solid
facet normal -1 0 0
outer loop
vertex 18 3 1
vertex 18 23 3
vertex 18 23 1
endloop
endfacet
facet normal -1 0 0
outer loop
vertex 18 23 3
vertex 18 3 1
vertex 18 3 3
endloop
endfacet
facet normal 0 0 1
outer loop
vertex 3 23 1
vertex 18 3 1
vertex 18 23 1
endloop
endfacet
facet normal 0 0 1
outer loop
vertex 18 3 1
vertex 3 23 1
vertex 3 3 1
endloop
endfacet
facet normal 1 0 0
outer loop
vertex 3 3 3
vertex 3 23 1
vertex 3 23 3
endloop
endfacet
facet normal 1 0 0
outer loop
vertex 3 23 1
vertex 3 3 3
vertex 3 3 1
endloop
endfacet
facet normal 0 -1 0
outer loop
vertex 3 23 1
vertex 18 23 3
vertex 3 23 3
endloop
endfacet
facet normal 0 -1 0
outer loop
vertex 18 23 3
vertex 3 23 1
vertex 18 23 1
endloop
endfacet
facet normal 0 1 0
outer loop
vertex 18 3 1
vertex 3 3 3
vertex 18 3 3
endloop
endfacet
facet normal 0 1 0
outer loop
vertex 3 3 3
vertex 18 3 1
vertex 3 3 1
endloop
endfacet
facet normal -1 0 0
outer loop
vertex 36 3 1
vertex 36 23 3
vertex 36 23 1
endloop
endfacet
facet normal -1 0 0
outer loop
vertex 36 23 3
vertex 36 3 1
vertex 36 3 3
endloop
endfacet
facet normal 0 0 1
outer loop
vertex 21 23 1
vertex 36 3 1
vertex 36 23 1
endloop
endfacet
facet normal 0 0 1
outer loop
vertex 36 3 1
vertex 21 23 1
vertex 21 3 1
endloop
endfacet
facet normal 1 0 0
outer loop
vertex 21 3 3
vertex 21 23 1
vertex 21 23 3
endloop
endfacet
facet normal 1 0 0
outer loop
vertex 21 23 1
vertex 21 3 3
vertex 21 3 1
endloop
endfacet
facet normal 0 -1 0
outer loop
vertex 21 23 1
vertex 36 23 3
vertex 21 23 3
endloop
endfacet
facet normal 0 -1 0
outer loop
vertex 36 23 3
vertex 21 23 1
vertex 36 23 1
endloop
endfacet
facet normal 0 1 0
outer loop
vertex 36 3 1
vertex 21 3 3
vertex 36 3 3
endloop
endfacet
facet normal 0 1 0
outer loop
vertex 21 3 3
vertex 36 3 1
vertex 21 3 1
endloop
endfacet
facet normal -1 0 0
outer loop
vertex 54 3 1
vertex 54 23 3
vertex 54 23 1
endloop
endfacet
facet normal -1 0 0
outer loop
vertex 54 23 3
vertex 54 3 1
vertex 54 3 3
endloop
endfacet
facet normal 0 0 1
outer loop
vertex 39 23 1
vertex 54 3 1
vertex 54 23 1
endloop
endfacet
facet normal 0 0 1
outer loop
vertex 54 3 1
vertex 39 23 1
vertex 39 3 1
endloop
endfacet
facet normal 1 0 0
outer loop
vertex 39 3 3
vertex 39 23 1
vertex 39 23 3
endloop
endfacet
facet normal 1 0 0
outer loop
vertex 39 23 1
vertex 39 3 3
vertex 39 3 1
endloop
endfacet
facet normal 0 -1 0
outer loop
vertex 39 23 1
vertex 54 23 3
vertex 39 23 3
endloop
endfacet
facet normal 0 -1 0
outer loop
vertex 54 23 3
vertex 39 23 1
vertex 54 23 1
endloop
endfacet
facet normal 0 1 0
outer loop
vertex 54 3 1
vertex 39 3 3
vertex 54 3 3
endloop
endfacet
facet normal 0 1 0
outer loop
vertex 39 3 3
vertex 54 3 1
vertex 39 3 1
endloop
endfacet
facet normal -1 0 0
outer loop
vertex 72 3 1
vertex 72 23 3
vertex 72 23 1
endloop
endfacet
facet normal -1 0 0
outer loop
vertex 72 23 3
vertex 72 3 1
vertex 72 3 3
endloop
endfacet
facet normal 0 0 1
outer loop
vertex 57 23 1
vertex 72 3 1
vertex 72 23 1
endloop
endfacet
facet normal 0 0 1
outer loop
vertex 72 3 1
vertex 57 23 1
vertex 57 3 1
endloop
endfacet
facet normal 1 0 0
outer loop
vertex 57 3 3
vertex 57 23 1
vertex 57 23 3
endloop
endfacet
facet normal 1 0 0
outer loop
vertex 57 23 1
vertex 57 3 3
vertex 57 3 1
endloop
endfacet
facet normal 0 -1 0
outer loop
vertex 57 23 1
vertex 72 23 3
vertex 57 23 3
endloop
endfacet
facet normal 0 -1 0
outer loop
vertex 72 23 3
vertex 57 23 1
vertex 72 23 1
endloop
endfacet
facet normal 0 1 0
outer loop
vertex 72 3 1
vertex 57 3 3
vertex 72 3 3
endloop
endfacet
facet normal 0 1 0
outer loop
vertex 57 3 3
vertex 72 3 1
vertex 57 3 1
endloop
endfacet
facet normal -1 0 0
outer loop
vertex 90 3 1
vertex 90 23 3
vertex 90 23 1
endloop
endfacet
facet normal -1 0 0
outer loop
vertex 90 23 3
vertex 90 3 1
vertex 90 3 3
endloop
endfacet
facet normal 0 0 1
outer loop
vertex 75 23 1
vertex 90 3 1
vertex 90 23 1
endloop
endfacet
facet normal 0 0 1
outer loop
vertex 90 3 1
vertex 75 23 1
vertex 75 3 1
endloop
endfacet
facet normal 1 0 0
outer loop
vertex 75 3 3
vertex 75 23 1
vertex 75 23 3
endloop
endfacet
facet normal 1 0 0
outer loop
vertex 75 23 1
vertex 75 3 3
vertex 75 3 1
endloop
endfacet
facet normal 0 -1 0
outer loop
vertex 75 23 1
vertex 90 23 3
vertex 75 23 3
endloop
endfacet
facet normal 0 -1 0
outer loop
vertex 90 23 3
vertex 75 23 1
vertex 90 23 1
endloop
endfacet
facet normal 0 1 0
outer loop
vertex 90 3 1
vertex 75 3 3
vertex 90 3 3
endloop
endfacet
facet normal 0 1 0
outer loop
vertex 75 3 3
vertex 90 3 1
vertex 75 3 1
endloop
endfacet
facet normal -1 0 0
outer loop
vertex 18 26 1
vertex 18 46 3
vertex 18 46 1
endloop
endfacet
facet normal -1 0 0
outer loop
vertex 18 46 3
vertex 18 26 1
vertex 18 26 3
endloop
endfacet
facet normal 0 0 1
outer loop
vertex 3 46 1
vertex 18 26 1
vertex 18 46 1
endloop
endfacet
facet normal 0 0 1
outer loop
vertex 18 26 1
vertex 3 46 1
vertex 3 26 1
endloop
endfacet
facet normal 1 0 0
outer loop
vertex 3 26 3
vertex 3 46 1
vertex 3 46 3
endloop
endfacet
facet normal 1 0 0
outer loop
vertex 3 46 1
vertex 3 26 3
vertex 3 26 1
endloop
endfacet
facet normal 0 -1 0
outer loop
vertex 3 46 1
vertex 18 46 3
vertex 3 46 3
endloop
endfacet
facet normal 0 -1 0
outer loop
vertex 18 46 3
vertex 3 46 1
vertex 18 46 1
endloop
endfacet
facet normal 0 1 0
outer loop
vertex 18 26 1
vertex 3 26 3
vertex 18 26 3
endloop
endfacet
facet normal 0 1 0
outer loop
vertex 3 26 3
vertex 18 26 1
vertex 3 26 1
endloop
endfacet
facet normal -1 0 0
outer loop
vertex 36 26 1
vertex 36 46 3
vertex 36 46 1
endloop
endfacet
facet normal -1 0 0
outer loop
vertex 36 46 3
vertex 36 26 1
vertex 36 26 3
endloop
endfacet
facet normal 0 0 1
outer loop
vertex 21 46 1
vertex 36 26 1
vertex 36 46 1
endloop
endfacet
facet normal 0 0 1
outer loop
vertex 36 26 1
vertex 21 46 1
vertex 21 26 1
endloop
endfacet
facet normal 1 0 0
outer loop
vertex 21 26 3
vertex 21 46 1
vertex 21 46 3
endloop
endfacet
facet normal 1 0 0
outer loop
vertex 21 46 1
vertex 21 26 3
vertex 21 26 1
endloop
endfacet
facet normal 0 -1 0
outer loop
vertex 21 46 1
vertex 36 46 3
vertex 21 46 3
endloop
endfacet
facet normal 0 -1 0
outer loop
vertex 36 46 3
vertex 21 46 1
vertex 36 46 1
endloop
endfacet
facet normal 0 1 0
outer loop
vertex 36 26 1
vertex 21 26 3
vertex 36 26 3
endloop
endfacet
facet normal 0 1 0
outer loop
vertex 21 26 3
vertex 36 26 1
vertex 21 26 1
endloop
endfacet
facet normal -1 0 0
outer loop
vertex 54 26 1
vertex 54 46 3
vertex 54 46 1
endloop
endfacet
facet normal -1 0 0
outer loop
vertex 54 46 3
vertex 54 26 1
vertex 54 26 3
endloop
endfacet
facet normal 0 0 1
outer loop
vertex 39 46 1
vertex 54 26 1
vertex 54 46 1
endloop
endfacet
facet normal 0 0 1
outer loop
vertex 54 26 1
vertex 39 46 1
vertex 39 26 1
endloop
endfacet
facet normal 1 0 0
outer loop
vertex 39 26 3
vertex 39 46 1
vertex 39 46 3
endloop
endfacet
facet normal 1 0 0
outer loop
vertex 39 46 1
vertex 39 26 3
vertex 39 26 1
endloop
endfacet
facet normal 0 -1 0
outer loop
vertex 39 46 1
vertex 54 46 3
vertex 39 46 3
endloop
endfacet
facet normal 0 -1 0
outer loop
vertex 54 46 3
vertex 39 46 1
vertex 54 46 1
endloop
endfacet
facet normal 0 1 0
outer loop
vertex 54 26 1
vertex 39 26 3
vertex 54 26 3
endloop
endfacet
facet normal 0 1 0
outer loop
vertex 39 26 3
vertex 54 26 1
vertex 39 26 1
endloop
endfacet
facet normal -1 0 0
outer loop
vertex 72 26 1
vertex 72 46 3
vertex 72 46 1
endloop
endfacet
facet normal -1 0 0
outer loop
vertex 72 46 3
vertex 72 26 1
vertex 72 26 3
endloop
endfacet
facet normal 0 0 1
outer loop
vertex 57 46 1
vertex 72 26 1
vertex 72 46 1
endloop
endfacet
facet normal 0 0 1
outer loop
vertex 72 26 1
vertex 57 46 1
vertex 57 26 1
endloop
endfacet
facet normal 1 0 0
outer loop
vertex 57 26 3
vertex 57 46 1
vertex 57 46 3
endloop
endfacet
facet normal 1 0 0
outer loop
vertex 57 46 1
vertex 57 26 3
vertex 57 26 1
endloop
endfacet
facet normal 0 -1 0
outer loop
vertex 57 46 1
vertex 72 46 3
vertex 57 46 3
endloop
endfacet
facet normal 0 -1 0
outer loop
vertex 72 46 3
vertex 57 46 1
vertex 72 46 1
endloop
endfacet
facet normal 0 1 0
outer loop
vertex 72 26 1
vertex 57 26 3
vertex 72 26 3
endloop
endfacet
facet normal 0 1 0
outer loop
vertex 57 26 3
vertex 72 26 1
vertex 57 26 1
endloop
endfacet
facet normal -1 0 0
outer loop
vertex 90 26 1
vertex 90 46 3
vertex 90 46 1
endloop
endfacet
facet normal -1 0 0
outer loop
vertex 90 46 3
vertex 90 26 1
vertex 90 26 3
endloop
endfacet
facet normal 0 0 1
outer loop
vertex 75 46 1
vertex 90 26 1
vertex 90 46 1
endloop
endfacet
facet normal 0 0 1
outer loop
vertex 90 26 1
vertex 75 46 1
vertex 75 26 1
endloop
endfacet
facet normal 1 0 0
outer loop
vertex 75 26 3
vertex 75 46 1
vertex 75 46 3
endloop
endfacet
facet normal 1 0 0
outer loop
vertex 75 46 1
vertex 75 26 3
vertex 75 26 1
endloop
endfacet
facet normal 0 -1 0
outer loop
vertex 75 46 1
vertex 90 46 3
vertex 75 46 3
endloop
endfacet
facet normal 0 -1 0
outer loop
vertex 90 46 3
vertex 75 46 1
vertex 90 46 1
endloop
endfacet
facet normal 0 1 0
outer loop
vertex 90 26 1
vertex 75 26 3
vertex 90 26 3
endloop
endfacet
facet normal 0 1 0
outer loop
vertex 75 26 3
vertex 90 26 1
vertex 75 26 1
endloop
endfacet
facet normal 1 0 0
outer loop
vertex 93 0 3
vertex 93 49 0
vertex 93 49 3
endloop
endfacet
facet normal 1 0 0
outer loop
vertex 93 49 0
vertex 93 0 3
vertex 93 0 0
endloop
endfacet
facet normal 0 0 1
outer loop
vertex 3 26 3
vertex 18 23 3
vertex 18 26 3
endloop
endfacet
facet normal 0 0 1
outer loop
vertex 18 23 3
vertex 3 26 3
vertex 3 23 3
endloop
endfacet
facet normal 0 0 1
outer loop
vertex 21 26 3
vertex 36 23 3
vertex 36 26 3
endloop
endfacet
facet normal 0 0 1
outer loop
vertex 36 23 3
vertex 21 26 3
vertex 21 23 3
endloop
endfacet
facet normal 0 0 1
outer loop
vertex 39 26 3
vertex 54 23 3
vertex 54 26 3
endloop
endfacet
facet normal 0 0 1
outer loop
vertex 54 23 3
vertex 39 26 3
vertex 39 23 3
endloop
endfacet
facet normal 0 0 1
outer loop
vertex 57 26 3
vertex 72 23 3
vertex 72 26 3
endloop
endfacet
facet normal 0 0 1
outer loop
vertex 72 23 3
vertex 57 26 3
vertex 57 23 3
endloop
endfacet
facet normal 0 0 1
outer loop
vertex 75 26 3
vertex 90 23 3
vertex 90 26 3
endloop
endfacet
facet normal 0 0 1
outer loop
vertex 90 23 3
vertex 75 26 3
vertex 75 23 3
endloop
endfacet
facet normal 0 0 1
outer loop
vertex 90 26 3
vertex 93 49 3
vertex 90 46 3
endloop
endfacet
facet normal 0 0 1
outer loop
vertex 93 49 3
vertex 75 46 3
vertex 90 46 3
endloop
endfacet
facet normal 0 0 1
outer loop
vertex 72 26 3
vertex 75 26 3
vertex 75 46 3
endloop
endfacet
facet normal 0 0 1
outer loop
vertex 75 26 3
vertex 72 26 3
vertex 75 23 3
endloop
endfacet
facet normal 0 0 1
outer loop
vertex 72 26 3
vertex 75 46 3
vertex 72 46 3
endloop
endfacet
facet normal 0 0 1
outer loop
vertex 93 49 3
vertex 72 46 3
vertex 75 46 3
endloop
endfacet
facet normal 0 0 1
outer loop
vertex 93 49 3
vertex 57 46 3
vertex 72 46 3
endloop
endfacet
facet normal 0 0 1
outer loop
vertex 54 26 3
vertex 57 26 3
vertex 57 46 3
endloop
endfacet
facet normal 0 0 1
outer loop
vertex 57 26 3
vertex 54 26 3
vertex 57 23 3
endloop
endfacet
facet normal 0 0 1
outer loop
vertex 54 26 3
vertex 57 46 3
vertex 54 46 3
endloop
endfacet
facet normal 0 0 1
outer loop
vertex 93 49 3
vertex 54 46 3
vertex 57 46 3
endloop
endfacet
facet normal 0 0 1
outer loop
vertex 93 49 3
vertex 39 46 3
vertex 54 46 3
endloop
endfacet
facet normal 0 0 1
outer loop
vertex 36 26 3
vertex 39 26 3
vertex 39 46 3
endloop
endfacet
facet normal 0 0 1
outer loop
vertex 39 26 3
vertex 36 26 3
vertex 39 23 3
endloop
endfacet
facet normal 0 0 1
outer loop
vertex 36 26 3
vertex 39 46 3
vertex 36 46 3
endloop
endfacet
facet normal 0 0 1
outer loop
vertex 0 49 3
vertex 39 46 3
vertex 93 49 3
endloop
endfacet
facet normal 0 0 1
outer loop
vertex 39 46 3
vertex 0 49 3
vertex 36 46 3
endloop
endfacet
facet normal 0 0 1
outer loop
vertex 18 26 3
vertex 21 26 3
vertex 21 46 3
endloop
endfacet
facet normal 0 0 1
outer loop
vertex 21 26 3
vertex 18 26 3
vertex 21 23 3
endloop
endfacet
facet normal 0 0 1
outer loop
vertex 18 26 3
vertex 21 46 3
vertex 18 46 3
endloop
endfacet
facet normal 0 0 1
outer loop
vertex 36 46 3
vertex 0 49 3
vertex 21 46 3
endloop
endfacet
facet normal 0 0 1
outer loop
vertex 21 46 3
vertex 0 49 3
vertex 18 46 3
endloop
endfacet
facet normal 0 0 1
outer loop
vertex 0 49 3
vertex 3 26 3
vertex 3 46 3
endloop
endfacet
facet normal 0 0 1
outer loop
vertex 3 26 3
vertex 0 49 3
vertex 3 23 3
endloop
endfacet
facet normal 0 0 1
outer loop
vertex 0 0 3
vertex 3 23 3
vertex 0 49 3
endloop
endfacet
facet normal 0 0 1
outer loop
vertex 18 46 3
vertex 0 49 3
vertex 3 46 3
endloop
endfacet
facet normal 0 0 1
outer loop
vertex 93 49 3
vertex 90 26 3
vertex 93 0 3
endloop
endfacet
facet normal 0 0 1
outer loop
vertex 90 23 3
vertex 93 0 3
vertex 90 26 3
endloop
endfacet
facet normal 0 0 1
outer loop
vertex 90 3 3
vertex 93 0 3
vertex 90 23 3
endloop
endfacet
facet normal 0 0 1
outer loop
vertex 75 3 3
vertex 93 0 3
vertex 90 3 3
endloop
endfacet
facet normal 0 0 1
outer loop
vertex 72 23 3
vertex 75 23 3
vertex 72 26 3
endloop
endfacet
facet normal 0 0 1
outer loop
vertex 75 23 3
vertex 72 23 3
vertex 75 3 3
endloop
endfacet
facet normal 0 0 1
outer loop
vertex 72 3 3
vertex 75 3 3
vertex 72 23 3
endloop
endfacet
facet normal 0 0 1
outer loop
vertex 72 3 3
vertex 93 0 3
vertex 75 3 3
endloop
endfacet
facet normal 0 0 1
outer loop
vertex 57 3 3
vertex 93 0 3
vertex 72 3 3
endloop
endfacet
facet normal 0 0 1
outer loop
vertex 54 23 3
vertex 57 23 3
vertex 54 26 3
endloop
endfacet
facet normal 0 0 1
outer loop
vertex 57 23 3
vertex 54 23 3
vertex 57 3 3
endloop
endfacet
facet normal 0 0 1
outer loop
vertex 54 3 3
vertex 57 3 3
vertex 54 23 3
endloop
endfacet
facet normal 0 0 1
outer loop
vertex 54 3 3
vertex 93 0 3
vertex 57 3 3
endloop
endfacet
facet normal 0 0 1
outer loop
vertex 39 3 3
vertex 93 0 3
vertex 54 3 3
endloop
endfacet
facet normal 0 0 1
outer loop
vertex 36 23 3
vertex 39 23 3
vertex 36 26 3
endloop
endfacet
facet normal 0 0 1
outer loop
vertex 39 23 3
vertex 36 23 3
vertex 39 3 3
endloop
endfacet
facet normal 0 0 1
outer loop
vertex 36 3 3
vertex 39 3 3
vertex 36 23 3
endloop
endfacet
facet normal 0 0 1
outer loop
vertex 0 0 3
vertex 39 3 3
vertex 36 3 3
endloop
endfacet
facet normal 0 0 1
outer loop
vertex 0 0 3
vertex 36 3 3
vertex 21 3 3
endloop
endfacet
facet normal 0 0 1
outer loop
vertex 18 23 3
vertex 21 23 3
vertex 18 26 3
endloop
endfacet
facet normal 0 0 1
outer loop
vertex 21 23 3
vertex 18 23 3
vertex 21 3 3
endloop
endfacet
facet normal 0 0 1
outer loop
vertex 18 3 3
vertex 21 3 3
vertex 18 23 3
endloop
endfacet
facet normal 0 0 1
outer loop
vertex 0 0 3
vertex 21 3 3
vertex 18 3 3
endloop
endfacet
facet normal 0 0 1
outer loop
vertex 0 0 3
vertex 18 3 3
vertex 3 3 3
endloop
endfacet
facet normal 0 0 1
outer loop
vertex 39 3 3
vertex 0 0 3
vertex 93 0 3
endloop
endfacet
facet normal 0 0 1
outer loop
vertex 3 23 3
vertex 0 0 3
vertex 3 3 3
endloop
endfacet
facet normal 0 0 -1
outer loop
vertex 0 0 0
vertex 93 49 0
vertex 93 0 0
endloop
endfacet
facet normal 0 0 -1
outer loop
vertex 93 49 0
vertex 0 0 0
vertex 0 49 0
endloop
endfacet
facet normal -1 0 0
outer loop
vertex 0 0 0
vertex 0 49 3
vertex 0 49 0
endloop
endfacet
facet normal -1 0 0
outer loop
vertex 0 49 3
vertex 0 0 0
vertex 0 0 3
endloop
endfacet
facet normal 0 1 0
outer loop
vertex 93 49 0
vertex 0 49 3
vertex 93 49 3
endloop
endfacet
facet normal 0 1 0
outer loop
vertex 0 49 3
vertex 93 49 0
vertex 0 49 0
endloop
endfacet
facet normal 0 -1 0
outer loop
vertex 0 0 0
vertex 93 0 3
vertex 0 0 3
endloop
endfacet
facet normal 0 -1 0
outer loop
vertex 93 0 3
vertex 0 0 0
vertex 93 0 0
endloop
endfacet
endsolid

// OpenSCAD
//Organizador de tornillos o componentes electrónicos pequeños

// 30 de septiembre de 2018

// variables necesarias para que sea totalmente paramétrico

altura_base = 1; // la altura de la base... parece lógico
altura_marco = 2; // pues eso
anchura_marco = 3;  // la separación entre los huecos
size_cuadro_x = 15; // el tamaño de cada cuadro en el eje x
size_cuadro_y = 20; // el tamaño en y
cantidad_x = 5; //el número de cuadros en el eje x
cantidad_y = 2; // el número de cuadros en el eje y

//listo... no se me ocurren más parametrizaciones
// la pieza en sí es una resta de un cubo y una iteración de cubos
// ahí vamos... primero la resta simple

difference()
{
    union()
    {
        //aquí el cubo principal
        cube([cantidad_x * (size_cuadro_x + anchura_marco) + anchura_marco, cantidad_y * (size_cuadro_y + anchura_marco) + anchura_marco, altura_base + altura_marco]); //
    }
    union()
    {
        for (y = [anchura_marco : size_cuadro_y + anchura_marco: cantidad_y * (anchura_marco + size_cuadro_y) ])
            {
            for (x = [anchura_marco : size_cuadro_x + anchura_marco: cantidad_x * (anchura_marco +  size_cuadro_x) ])
            { 
            translate([x, y ,altura_base]) cube([size_cuadro_x, size_cuadro_y, 2 * altura_marco]);
            }
        }
    }
}
//listo... que lo busques en github jeje
